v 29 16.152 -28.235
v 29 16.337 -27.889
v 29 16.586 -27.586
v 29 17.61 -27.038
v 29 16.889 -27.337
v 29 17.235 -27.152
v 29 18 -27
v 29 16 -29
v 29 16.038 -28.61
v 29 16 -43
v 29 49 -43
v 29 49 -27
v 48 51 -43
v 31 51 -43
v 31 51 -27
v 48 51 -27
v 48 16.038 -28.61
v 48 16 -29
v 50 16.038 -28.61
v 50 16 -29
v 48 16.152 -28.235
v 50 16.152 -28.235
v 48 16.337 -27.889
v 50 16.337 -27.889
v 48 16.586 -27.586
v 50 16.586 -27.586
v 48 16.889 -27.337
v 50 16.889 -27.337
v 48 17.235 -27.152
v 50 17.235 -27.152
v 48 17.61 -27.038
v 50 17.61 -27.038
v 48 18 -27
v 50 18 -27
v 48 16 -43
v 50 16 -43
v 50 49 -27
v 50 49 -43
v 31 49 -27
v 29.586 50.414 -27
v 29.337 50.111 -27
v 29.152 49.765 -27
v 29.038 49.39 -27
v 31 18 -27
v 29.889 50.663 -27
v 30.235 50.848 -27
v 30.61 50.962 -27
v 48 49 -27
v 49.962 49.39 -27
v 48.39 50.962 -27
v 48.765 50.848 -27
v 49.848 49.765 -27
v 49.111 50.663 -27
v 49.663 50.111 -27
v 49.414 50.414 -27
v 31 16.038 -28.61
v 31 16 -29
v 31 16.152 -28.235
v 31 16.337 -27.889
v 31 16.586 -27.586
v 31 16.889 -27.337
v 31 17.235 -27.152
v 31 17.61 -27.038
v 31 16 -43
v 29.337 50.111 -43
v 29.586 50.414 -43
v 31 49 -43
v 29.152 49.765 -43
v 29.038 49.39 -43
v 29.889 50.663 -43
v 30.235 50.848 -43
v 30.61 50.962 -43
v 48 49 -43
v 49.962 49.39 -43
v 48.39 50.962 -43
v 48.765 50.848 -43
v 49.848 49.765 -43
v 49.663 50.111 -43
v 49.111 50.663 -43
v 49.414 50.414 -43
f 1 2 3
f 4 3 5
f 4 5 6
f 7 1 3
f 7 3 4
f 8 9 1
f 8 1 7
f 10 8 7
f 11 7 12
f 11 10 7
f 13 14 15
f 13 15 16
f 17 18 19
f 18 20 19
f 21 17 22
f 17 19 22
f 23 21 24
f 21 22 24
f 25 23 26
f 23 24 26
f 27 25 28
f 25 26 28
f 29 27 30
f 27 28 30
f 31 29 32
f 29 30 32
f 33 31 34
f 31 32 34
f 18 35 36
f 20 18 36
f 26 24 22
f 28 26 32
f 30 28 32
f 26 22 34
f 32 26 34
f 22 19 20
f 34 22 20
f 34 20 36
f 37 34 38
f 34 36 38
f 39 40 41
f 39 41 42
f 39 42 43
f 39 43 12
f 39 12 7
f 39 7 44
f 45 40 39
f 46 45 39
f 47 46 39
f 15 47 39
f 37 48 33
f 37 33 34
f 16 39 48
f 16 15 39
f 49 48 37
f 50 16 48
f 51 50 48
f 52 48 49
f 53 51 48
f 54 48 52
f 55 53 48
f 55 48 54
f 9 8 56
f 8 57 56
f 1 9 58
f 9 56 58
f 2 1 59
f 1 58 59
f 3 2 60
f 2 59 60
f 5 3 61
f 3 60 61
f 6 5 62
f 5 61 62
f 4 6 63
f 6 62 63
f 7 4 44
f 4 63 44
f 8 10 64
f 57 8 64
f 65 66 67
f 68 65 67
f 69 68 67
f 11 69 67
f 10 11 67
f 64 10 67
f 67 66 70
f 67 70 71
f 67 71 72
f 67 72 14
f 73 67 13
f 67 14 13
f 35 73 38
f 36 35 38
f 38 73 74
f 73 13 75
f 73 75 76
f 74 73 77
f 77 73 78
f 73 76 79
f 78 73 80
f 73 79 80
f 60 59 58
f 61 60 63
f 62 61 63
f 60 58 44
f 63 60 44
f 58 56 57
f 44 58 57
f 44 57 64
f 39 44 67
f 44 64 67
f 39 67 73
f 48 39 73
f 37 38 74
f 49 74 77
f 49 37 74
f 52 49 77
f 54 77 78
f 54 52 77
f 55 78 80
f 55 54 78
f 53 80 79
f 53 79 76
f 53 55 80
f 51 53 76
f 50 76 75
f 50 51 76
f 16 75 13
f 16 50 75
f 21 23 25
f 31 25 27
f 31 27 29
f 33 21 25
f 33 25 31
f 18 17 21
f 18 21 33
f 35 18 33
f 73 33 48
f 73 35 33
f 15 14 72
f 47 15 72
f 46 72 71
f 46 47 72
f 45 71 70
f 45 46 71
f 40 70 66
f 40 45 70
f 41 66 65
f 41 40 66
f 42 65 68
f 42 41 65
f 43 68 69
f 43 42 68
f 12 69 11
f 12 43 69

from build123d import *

# Parameters (mm, degrees)
BOX014_W     = 2
BOX014_H     = 35
BOX014_DEPTH = 16
BOX015_W     = 2
BOX015_H     = 35
BOX015_DEPTH = 16
BOX017_W     = 21
BOX017_H     = 2
BOX017_DEPTH = 16
FILLET012_R  = 2


with BuildPart() as cubo013:
    # Box014 → Box014 (new body)
    with BuildSketch(Plane(origin=(29, 29, -46), x_dir=(1, 0, 0), z_dir=(0, 0, 1))):
        with Locations((1, 17.5)):
            Rectangle(BOX014_W, BOX014_H)
    extrude(amount=BOX014_DEPTH)


with BuildPart() as cubo014:
    # Box015 → Box015 (new body)
    with BuildSketch(Plane(origin=(48, 29, -46), x_dir=(1, 0, 0), z_dir=(0, 0, 1))):
        with Locations((1, 17.5)):
            Rectangle(BOX015_W, BOX015_H)
    extrude(amount=BOX015_DEPTH)


with BuildPart() as fillet012:
    # Box017 → Box017 (new body)
    with BuildSketch(Plane(origin=(29, 62, -46), x_dir=(1, 0, 0), z_dir=(0, 0, 1))):
        with Locations((10.5, 1)):
            Rectangle(BOX017_W, BOX017_H)
    extrude(amount=BOX017_DEPTH)

    # Fusion: union Cubo013, Cubo014
    add(cubo013.part)
    add(cubo014.part)

    # Fillet012
    fillet012_edges = [fillet012.edges().sort_by_distance(p)[0] for p in [
        (30, 29, -30),
        (49, 29, -30),
        (29, 64, -38),
        (50, 64, -38),
    ]]
    fillet(fillet012_edges, radius=FILLET012_R)


with BuildPart() as fillet012_1:
    # Fillet012 placement: moved
    add(fillet012.part.moved(Location((0, -13, 3))))


solid = fillet012_1.part
